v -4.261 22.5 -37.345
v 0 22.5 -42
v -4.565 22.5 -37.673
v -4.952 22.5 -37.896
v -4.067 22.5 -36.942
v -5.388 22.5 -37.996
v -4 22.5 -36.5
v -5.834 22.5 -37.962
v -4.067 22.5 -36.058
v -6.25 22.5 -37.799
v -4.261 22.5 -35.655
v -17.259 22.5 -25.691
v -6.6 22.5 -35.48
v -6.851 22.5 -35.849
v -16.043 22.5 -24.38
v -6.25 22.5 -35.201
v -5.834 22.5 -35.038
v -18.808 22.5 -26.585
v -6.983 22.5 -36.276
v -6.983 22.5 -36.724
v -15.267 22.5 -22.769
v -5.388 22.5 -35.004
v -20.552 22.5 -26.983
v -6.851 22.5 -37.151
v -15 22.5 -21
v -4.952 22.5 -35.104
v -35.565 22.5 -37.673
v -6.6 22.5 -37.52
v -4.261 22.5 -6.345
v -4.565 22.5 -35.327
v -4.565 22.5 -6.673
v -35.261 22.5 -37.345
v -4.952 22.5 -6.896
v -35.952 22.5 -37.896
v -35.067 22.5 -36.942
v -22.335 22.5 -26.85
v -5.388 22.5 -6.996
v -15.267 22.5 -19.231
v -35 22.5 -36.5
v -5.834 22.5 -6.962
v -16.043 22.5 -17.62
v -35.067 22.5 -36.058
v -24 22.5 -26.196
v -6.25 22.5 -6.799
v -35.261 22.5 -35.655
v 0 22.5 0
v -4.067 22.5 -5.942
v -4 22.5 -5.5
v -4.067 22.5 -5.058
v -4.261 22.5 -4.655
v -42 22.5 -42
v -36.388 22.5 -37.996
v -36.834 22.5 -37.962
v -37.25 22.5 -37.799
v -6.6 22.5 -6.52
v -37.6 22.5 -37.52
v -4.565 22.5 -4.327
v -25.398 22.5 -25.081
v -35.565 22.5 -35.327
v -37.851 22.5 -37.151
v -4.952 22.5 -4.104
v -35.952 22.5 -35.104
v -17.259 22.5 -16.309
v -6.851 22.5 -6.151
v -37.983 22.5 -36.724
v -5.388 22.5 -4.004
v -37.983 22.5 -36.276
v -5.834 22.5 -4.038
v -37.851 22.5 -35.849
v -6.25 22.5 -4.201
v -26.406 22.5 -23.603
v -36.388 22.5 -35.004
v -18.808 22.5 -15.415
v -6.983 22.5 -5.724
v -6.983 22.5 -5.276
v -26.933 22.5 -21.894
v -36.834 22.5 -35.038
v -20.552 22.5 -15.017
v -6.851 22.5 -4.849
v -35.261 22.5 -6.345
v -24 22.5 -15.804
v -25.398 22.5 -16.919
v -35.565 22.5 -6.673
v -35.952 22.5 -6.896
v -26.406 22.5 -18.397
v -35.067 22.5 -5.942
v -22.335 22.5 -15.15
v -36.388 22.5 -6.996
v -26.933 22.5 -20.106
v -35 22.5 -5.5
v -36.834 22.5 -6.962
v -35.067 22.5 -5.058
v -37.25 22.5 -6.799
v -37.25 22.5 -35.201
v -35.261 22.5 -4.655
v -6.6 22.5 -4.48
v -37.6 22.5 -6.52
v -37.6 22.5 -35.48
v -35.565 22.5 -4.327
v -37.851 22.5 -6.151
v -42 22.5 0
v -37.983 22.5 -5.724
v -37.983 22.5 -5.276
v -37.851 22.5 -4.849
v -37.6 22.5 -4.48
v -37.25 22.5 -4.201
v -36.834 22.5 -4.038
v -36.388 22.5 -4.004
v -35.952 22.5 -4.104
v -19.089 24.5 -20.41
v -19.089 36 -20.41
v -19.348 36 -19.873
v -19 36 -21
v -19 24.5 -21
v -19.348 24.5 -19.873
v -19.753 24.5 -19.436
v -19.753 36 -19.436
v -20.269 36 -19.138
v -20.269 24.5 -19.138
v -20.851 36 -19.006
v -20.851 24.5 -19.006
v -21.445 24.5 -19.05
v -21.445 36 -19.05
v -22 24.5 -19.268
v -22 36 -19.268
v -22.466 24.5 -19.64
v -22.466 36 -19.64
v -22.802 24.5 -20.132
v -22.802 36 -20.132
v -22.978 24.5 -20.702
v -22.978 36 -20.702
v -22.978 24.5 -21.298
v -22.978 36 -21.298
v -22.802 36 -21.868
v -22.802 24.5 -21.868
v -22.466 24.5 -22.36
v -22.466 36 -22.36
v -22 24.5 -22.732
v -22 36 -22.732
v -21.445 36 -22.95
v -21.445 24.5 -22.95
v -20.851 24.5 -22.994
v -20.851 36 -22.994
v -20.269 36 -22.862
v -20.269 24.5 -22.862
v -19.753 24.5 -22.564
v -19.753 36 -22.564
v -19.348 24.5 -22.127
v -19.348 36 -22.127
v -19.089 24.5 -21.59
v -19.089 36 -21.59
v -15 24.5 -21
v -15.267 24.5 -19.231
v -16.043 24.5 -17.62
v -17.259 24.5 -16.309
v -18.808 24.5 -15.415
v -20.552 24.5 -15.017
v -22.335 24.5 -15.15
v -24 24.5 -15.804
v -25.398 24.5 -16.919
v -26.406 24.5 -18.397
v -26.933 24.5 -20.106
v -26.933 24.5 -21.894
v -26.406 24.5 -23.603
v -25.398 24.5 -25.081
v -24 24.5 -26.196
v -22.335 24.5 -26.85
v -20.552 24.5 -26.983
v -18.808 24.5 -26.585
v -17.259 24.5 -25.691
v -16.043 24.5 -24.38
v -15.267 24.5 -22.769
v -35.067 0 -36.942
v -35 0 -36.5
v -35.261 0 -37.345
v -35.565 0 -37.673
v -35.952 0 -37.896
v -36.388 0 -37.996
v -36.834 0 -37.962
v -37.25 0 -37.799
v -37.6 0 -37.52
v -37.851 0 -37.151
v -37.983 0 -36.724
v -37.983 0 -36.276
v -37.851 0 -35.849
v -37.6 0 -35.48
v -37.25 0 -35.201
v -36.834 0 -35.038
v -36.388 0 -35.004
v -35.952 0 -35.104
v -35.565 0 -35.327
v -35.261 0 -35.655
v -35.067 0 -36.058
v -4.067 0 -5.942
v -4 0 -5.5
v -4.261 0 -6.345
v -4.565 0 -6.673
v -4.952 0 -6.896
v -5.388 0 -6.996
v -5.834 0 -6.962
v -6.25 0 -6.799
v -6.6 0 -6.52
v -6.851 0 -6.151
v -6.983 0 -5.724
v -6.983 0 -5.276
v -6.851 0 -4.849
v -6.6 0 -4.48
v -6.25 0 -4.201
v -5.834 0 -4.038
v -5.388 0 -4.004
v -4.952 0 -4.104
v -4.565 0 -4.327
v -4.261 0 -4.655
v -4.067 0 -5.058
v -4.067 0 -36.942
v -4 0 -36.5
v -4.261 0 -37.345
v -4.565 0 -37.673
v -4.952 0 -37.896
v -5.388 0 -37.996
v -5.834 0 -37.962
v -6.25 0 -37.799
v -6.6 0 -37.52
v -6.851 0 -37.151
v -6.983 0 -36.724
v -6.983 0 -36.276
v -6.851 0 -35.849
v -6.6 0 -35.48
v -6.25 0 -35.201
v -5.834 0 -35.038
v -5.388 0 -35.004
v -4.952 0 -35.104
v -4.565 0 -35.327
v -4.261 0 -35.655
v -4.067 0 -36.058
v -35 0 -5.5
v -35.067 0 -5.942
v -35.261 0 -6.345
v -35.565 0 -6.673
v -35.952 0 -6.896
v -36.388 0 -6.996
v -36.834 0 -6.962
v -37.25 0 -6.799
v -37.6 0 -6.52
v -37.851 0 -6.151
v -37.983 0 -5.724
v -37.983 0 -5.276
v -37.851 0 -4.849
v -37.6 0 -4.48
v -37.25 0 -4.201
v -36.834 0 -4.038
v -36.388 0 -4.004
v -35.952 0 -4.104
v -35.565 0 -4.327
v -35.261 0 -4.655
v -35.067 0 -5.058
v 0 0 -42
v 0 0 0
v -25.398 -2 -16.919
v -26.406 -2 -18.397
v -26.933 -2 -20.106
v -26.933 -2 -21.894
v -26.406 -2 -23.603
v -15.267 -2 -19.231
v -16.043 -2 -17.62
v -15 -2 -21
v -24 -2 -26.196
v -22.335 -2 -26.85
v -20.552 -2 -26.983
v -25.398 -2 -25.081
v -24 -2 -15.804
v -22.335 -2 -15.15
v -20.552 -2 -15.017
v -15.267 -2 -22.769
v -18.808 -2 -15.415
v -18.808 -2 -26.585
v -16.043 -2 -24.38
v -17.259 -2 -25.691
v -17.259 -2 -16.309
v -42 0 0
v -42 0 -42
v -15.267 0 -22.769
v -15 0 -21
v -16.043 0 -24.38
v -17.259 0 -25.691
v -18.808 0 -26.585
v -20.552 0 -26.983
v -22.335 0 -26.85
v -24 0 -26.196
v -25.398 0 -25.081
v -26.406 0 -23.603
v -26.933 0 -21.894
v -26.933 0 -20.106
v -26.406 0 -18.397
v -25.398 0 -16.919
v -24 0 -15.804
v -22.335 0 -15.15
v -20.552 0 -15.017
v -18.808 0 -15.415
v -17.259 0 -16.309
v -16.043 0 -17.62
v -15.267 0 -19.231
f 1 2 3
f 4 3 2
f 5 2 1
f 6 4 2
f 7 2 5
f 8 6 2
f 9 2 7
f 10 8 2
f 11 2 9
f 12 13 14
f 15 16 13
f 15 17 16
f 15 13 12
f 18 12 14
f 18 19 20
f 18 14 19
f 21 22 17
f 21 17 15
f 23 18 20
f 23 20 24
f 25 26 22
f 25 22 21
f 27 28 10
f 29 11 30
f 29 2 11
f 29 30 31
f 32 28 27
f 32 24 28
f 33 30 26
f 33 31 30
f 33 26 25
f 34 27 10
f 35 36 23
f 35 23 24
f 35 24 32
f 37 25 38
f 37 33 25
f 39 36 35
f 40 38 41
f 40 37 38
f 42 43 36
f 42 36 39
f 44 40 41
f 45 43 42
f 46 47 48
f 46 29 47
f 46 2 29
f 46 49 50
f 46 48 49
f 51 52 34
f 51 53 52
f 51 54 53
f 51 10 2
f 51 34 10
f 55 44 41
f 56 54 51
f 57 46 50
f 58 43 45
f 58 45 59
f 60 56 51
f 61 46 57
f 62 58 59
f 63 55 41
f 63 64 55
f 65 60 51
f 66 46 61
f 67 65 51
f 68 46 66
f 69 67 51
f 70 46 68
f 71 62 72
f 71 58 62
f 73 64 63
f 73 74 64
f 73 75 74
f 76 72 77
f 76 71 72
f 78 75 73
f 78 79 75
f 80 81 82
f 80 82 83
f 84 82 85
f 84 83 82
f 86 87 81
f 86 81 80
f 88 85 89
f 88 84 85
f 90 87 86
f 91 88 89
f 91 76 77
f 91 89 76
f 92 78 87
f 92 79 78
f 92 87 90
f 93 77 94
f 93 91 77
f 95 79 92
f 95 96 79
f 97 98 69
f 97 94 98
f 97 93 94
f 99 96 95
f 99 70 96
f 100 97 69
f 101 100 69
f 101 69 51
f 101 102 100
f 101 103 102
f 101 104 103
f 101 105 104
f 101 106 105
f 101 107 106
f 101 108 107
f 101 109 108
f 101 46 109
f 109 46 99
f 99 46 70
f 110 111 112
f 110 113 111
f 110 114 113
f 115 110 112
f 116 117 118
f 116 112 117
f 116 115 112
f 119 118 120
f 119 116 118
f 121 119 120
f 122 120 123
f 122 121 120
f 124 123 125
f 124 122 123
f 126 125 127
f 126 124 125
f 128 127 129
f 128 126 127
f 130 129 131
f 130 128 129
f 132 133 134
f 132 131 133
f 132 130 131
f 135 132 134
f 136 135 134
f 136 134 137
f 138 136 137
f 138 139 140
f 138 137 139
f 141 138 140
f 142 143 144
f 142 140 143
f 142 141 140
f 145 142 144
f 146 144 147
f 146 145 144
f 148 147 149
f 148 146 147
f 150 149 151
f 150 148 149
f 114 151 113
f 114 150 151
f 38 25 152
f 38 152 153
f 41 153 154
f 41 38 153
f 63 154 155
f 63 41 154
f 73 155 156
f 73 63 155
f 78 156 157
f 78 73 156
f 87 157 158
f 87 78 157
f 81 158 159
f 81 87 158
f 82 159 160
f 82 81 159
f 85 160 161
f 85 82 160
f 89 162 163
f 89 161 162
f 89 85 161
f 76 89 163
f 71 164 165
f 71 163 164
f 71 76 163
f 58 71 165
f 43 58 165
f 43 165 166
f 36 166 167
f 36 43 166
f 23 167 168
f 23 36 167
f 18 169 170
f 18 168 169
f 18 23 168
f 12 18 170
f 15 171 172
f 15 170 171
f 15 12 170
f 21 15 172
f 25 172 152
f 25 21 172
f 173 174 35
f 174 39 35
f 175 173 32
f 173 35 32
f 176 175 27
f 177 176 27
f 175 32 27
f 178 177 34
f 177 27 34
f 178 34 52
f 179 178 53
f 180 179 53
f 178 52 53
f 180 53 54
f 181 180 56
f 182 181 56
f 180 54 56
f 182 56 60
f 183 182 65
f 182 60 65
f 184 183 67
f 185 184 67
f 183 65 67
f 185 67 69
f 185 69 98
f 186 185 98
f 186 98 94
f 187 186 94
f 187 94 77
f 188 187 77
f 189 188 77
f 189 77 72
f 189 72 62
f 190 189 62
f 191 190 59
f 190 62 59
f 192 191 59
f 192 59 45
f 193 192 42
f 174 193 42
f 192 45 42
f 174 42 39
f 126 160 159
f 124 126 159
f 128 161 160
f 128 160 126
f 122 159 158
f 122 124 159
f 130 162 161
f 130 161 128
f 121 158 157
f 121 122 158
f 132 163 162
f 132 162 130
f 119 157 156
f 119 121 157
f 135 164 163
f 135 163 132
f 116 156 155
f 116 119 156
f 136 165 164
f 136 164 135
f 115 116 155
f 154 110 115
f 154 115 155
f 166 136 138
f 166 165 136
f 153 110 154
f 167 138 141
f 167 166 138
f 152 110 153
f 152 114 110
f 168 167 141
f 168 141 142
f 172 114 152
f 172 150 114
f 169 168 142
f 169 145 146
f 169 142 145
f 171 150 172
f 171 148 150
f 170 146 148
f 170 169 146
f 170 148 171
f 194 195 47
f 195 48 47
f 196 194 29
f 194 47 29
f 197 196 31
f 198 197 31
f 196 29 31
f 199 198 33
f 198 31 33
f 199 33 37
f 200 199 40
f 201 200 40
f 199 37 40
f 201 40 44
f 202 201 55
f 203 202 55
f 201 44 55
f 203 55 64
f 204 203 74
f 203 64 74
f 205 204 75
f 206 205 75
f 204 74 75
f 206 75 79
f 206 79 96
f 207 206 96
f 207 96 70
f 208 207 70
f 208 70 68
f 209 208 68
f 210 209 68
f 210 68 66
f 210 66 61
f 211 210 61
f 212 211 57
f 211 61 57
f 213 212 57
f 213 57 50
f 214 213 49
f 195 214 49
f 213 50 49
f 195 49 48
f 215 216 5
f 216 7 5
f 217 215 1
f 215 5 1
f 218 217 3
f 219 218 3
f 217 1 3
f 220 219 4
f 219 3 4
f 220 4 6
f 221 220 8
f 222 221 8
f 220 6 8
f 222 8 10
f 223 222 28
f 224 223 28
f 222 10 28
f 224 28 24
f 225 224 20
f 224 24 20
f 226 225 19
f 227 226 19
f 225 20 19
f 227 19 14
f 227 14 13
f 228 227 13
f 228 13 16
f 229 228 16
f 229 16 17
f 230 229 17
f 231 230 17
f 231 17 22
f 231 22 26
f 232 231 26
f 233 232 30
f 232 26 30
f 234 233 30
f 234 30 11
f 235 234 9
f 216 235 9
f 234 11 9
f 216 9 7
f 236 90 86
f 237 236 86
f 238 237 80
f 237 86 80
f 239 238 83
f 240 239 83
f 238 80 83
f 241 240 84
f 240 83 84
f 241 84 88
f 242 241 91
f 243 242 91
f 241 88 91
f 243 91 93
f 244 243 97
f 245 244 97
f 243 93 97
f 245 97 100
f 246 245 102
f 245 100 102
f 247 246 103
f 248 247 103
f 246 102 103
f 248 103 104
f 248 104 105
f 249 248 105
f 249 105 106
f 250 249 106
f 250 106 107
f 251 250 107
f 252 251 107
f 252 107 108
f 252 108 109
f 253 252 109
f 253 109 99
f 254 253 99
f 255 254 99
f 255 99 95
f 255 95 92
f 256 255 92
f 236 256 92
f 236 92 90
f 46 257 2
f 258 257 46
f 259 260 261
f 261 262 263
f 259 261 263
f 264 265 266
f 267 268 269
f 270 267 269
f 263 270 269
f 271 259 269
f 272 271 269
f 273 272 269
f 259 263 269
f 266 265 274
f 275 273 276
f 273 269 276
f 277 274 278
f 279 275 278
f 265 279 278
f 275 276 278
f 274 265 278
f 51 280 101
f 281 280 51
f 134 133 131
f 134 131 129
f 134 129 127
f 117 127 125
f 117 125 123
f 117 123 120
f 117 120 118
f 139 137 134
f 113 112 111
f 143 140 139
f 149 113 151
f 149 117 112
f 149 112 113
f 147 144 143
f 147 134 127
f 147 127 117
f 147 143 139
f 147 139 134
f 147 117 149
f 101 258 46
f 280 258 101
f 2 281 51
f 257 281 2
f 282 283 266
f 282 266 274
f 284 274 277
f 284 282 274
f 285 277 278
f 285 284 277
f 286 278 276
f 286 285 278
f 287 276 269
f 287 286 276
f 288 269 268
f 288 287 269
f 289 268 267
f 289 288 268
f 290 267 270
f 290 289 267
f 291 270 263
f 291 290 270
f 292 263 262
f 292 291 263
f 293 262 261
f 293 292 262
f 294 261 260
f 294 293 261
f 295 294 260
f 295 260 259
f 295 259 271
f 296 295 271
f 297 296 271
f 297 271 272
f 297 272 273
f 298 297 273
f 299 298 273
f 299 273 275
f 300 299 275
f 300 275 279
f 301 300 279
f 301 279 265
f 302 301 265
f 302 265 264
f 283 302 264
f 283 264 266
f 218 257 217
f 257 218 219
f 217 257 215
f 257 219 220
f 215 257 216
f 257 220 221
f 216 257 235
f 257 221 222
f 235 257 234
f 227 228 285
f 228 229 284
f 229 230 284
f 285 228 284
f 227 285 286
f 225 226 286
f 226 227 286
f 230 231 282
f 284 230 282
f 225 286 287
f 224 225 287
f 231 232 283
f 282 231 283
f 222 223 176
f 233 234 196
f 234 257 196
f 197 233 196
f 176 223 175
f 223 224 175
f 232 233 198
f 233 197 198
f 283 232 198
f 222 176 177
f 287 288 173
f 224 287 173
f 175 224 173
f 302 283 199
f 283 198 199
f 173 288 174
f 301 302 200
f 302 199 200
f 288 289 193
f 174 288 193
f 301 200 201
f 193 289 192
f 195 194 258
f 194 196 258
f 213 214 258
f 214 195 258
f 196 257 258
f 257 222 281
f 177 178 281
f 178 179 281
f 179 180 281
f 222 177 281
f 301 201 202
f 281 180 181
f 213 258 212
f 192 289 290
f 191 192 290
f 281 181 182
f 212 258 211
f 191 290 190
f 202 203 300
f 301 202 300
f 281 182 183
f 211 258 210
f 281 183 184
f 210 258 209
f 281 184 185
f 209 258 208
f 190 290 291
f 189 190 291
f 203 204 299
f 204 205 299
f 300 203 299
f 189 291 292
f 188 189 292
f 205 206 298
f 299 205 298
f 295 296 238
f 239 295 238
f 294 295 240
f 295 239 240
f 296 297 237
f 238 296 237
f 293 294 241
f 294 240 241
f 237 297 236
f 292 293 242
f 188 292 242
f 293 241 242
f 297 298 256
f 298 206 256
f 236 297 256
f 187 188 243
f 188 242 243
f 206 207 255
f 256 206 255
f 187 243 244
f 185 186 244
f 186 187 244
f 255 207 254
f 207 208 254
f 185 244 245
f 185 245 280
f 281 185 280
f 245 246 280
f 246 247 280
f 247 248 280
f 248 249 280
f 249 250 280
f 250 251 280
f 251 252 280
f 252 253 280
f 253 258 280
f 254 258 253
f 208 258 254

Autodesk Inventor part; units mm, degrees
ref_plane "YZ Plane" through (0, 0, 0) normal (1, 0, 0) x (0, 1, 0)
ref_plane "XZ Plane" through (0, 0, 0) normal (0, 1, 0) x (-1, 0, 0)
ref_plane "XY Plane" through (0, 0, 0) normal (0, 0, 1) x (1, 0, 0)
sketch "Sketch1" plane through (0, 0, 0) normal (0, 1, 0) x (-1, 0, 0)
  line L0 (0, 0) -> (42, 0)
  line L1 (42, 0) -> (42, -42)
  line L2 (42, -42) -> (0, -42)
  line L3 (0, -42) -> (0, 0)
  dimension "d0" = 42
  dimension "d1" = 42
extrude "Extrusion1" add sketch "Sketch1" along normal blind 22.5
sketch "Sketch2" plane through (0, 22.5, 0) normal (0, 1, 0) x (1, 0, 0)
  circle A0 centre (-21, 21) radius 6
  line L0 (-42, 42) -> (-42, 0) projected
  line L1 (-42, 0) -> (0, 0) projected
  point P0 (-42, 21)
  point P1 (-21, 0)
  dimension "d4" = 12
extrude "Extrusion2" add sketch "Sketch2" along normal blind 2 and the other way blind 24.5
sketch "Sketch3" plane through (-21, 24.5, -21) normal (0, 1, 0) x (1, 0, 0)
  circle A0 centre (0, 0) radius 2
  point P0 (21, -21)
  dimension "d7" = 4
extrude "Extrusion3" add sketch "Sketch3" along normal blind 11.5
sketch "Sketch4" plane through (0, 22.5, 0) normal (0, 1, 0) x (1, 0, 0)
  circle A0 centre (-5.5, 5.5) radius 1.5
  circle A1 centre (-36.5, 5.5) radius 1.5
  circle A2 centre (-36.5, 36.5) radius 1.5
  circle A3 centre (-5.5, 36.5) radius 1.5
  line L0 (0, 0) -> (0, 42) projected
  line L1 (0, 42) -> (-42, 42) projected
  line L2 (-42, 42) -> (-42, 0) projected
  line L3 (-42, 0) -> (0, 0) projected
  dimension "d10" = 3
  dimension "d11" = 3
  dimension "d12" = 3
  dimension "d13" = 3
  dimension "d14" = 31
  dimension "d15" = 31
  dimension "d16" = 5.5
  dimension "d17" = 5.5
  dimension "d22" = 31
  dimension "d23" = 31
  dimension "d24" = 5.5
  dimension "d25" = 5.5
  dimension "d26" = 5.5
  dimension "d27" = 5.5
extrude "Extrusion4" cut sketch "Sketch4" against normal up to next contours A0 | A1 | A2 | A3
properties part number "Motor"
